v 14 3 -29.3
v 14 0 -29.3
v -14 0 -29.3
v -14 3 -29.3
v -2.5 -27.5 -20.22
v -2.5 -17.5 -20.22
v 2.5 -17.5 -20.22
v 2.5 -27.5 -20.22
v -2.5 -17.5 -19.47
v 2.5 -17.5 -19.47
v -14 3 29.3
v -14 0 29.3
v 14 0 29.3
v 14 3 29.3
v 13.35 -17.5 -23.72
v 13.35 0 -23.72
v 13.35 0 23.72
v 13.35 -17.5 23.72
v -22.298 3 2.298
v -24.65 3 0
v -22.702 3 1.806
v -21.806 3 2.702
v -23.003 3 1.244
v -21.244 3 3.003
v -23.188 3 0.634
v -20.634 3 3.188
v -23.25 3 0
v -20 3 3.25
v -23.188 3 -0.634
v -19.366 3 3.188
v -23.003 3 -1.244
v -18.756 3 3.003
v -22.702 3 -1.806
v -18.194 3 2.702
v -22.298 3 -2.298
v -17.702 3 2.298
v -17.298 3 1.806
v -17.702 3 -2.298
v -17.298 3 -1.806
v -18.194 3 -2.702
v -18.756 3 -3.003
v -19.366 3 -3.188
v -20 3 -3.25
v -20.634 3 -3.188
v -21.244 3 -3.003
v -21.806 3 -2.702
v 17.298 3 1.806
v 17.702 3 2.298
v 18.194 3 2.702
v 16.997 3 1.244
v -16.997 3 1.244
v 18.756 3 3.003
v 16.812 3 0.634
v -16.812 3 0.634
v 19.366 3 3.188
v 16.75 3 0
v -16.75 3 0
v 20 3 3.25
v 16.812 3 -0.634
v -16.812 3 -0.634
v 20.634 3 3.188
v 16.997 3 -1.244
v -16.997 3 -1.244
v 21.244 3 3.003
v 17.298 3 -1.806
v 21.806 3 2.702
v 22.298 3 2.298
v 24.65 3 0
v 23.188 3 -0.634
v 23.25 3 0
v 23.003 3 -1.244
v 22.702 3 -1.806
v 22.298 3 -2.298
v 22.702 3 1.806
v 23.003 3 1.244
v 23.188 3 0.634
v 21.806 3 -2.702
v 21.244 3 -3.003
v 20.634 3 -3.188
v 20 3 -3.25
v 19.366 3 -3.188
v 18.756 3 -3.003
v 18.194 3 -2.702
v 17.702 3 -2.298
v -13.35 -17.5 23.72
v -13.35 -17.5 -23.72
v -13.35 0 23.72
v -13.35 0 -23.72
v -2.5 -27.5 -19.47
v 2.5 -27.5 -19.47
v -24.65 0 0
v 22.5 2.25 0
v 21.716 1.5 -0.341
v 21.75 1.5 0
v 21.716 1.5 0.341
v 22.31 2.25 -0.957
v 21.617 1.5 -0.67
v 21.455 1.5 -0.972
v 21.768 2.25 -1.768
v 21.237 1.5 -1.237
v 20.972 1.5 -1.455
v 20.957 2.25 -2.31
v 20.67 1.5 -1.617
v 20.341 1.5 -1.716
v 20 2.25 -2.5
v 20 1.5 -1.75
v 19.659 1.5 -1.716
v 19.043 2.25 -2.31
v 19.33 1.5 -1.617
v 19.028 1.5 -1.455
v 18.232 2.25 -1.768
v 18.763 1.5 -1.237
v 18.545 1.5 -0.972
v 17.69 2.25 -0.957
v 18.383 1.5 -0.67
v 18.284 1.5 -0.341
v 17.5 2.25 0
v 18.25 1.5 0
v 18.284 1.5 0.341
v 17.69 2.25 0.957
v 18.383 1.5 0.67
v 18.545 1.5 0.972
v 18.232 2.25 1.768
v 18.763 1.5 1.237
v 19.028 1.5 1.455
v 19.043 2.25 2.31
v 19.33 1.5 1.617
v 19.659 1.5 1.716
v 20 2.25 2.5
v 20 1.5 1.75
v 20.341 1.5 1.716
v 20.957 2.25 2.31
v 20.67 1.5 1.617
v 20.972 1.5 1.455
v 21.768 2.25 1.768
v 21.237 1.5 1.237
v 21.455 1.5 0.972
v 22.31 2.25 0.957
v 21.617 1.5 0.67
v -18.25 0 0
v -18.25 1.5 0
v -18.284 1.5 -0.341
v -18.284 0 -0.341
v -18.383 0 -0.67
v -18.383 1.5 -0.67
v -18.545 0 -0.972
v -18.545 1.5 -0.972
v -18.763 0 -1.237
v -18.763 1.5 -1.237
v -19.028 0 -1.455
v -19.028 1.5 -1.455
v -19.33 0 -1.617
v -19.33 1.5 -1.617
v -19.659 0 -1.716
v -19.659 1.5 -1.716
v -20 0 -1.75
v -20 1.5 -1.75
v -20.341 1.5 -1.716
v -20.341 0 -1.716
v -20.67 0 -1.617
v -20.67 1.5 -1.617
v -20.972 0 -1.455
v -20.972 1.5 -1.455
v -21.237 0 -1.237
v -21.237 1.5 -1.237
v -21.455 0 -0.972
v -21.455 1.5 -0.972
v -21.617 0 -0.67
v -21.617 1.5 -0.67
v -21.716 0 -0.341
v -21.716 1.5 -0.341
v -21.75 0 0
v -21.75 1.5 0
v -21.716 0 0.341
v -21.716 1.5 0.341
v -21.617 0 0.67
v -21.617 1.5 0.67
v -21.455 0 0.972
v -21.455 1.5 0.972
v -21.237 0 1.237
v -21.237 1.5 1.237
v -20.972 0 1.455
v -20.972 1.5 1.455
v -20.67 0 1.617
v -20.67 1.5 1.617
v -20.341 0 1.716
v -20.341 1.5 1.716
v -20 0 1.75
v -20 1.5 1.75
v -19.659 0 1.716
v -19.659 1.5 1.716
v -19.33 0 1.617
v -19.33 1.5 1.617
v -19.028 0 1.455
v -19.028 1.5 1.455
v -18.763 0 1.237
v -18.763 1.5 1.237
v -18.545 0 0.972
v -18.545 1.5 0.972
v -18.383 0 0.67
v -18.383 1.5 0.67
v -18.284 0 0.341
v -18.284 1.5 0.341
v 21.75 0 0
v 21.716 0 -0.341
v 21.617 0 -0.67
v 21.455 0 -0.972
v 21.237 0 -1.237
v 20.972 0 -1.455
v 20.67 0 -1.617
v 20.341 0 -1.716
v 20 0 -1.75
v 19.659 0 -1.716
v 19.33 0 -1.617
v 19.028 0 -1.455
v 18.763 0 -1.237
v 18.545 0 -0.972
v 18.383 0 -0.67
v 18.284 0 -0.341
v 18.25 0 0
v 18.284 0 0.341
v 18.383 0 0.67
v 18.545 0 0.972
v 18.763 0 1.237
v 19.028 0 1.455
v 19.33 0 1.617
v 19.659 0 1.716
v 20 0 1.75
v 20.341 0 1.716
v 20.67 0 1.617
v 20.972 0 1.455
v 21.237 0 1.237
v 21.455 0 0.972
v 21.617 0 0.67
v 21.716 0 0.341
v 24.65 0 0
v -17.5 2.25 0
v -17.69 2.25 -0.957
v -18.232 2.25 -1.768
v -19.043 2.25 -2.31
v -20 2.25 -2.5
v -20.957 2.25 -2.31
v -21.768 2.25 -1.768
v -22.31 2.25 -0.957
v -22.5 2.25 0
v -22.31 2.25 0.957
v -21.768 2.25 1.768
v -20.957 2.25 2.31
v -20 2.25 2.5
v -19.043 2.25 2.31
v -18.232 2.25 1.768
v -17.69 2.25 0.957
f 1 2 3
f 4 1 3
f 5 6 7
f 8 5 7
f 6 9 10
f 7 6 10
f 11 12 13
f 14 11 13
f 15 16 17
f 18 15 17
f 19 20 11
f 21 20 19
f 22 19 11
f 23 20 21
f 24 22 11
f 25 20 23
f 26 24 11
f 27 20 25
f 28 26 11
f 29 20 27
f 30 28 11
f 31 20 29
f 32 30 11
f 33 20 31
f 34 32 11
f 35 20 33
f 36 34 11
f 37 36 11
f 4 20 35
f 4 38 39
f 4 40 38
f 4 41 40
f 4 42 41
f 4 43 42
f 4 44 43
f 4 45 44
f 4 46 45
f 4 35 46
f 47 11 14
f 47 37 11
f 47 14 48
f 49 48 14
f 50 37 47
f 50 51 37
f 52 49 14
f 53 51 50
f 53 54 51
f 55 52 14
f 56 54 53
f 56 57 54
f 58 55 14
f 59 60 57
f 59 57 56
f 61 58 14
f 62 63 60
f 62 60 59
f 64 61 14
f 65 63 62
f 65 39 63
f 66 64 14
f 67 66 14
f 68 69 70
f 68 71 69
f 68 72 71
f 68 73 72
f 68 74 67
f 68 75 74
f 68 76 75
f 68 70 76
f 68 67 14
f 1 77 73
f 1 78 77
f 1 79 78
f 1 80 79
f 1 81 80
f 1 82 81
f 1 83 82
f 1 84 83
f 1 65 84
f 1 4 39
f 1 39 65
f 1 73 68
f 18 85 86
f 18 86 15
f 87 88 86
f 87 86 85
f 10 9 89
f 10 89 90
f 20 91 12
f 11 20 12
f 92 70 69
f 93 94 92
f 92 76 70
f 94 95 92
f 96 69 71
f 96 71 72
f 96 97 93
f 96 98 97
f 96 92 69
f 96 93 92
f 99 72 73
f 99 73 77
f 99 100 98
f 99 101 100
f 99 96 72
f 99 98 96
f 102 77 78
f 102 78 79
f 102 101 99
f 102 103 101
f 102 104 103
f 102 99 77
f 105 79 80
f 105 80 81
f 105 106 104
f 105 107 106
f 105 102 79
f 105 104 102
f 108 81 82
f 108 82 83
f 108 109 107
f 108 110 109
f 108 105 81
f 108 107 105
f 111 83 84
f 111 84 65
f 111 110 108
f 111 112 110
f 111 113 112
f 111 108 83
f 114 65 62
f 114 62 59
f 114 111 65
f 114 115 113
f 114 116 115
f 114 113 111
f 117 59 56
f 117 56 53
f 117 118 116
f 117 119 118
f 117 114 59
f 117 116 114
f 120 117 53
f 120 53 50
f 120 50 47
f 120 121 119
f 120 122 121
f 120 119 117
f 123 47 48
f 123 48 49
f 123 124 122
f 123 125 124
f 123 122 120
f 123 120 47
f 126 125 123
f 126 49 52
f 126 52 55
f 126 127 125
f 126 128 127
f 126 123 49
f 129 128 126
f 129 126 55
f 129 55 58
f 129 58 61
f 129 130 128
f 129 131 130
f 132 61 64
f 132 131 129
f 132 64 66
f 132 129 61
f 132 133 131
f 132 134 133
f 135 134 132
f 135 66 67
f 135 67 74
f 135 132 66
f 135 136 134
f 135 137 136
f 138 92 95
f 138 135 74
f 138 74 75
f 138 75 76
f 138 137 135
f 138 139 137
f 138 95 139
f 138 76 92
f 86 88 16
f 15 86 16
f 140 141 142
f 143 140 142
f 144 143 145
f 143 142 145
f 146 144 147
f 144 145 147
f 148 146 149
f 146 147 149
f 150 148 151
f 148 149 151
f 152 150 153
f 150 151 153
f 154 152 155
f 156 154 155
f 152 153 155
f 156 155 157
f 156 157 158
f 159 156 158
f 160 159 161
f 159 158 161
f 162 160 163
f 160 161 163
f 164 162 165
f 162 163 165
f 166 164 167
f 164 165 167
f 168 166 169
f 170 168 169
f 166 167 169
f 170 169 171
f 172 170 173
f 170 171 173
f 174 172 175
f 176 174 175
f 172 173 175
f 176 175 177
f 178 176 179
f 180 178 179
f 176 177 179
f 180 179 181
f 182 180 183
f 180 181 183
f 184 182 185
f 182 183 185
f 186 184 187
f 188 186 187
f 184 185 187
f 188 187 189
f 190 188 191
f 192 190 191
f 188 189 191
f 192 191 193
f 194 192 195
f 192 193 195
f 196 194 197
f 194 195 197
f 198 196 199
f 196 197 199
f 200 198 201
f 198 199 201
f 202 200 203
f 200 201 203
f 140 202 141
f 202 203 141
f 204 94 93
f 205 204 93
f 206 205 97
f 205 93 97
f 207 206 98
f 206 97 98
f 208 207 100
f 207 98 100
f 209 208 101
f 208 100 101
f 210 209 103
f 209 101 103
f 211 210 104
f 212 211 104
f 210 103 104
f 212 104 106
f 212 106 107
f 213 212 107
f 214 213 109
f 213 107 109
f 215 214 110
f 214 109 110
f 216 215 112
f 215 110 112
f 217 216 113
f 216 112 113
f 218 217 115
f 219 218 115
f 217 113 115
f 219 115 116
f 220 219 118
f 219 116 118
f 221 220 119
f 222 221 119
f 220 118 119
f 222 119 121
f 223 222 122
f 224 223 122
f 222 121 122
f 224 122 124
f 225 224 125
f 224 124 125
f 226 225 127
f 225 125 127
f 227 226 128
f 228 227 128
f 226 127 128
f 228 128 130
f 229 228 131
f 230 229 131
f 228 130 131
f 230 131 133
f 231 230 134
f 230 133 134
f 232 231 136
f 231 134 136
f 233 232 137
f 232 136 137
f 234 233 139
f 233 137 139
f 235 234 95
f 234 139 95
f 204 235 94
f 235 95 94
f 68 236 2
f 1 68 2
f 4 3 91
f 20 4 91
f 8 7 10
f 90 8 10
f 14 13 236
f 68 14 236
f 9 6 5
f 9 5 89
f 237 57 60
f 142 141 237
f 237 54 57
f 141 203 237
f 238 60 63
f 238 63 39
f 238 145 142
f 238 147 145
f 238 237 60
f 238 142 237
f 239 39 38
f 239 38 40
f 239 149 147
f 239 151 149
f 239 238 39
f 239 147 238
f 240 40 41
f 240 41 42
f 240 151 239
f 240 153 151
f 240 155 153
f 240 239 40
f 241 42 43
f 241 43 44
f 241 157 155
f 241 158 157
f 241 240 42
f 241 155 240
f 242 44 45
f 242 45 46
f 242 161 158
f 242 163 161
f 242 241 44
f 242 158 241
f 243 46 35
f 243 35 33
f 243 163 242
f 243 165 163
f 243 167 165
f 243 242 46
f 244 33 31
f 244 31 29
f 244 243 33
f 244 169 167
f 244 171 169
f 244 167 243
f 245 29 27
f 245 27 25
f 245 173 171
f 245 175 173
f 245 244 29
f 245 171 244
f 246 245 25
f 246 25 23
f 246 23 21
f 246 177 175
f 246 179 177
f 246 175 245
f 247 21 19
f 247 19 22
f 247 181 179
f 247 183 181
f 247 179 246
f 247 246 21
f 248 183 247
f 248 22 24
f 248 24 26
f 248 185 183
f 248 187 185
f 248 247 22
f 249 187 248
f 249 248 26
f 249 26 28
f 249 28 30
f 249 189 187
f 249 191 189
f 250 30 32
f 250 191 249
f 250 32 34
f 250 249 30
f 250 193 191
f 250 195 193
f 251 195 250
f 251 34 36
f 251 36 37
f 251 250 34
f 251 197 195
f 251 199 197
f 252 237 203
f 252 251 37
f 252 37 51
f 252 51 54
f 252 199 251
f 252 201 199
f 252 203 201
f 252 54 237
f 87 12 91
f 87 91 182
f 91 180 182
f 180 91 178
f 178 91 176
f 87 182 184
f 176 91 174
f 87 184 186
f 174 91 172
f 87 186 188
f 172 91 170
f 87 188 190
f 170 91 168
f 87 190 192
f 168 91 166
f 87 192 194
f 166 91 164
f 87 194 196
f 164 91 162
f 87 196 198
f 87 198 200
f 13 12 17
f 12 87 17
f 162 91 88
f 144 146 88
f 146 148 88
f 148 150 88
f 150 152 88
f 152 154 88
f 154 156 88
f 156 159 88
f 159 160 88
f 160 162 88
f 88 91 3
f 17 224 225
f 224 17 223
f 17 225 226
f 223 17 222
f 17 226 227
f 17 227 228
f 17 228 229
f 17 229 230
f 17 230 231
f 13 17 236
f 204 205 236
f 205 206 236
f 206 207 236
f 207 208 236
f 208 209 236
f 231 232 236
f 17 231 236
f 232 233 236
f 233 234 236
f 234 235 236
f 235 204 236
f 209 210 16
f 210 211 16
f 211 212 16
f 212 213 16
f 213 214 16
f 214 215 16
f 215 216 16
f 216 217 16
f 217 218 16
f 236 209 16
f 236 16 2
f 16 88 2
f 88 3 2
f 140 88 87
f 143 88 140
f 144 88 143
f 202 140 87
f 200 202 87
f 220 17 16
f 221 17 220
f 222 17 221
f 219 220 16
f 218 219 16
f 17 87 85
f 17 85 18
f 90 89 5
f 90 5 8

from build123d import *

# Parameters (mm, degrees)
BOSS_EXTRUDE1_DEPTH = 3
SKETCH2_W           = 26.7
SKETCH2_H           = 47.44
BOSS_EXTRUDE2_DEPTH = 17.5
SKETCH3_W           = 5
SKETCH3_H           = 0.75
BOSS_EXTRUDE3_DEPTH = 10
SKETCH4_R           = 1.75
CUT_EXTRUDE1_DEPTH  = 3
CHAMFER1_SIZE       = 1.5


with BuildPart() as part:
    # Sketch1 → Boss-Extrude1 (new body)
    with BuildSketch(Plane(origin=(0, 0, 0), x_dir=(1, 0, 0), z_dir=(0, 1, 0))):
        Polygon((14, 29.3), (-14, 29.3), (-24.65, 0), (-14, -29.3), (14, -29.3), (24.65, 0), align=None)
    extrude(amount=BOSS_EXTRUDE1_DEPTH)

    # Sketch2 → Boss-Extrude2 (add)
    with BuildSketch(Plane.XZ):
        Rectangle(SKETCH2_W, SKETCH2_H)
    extrude(amount=BOSS_EXTRUDE2_DEPTH)

    # Sketch4 → Cut-Extrude1 (cut)
    with BuildSketch(Plane(origin=(0, 3, 0), x_dir=(1, 0, 0), z_dir=(0, 1, 0))):
        with Locations((20, 0)):
            Circle(SKETCH4_R)
        with Locations((-20, 0)):
            Circle(SKETCH4_R)
    extrude(amount=-CUT_EXTRUDE1_DEPTH, mode=Mode.SUBTRACT)

    # Chamfer1
    chamfer1_edges = [part.edges().sort_by_distance(p)[0] for p in [
        (18.25, 3, 0),
        (-21.75, 3, 0),
    ]]
    chamfer(chamfer1_edges, length=CHAMFER1_SIZE)


with BuildPart() as body_2:
    # Sketch3 → Boss-Extrude3 (new body)
    with BuildSketch(Plane.XZ.offset(17.5)):
        with Locations((0, -19.845)):
            Rectangle(SKETCH3_W, SKETCH3_H)
    extrude(amount=BOSS_EXTRUDE3_DEPTH)


solid = Compound([part.part, body_2.part])
